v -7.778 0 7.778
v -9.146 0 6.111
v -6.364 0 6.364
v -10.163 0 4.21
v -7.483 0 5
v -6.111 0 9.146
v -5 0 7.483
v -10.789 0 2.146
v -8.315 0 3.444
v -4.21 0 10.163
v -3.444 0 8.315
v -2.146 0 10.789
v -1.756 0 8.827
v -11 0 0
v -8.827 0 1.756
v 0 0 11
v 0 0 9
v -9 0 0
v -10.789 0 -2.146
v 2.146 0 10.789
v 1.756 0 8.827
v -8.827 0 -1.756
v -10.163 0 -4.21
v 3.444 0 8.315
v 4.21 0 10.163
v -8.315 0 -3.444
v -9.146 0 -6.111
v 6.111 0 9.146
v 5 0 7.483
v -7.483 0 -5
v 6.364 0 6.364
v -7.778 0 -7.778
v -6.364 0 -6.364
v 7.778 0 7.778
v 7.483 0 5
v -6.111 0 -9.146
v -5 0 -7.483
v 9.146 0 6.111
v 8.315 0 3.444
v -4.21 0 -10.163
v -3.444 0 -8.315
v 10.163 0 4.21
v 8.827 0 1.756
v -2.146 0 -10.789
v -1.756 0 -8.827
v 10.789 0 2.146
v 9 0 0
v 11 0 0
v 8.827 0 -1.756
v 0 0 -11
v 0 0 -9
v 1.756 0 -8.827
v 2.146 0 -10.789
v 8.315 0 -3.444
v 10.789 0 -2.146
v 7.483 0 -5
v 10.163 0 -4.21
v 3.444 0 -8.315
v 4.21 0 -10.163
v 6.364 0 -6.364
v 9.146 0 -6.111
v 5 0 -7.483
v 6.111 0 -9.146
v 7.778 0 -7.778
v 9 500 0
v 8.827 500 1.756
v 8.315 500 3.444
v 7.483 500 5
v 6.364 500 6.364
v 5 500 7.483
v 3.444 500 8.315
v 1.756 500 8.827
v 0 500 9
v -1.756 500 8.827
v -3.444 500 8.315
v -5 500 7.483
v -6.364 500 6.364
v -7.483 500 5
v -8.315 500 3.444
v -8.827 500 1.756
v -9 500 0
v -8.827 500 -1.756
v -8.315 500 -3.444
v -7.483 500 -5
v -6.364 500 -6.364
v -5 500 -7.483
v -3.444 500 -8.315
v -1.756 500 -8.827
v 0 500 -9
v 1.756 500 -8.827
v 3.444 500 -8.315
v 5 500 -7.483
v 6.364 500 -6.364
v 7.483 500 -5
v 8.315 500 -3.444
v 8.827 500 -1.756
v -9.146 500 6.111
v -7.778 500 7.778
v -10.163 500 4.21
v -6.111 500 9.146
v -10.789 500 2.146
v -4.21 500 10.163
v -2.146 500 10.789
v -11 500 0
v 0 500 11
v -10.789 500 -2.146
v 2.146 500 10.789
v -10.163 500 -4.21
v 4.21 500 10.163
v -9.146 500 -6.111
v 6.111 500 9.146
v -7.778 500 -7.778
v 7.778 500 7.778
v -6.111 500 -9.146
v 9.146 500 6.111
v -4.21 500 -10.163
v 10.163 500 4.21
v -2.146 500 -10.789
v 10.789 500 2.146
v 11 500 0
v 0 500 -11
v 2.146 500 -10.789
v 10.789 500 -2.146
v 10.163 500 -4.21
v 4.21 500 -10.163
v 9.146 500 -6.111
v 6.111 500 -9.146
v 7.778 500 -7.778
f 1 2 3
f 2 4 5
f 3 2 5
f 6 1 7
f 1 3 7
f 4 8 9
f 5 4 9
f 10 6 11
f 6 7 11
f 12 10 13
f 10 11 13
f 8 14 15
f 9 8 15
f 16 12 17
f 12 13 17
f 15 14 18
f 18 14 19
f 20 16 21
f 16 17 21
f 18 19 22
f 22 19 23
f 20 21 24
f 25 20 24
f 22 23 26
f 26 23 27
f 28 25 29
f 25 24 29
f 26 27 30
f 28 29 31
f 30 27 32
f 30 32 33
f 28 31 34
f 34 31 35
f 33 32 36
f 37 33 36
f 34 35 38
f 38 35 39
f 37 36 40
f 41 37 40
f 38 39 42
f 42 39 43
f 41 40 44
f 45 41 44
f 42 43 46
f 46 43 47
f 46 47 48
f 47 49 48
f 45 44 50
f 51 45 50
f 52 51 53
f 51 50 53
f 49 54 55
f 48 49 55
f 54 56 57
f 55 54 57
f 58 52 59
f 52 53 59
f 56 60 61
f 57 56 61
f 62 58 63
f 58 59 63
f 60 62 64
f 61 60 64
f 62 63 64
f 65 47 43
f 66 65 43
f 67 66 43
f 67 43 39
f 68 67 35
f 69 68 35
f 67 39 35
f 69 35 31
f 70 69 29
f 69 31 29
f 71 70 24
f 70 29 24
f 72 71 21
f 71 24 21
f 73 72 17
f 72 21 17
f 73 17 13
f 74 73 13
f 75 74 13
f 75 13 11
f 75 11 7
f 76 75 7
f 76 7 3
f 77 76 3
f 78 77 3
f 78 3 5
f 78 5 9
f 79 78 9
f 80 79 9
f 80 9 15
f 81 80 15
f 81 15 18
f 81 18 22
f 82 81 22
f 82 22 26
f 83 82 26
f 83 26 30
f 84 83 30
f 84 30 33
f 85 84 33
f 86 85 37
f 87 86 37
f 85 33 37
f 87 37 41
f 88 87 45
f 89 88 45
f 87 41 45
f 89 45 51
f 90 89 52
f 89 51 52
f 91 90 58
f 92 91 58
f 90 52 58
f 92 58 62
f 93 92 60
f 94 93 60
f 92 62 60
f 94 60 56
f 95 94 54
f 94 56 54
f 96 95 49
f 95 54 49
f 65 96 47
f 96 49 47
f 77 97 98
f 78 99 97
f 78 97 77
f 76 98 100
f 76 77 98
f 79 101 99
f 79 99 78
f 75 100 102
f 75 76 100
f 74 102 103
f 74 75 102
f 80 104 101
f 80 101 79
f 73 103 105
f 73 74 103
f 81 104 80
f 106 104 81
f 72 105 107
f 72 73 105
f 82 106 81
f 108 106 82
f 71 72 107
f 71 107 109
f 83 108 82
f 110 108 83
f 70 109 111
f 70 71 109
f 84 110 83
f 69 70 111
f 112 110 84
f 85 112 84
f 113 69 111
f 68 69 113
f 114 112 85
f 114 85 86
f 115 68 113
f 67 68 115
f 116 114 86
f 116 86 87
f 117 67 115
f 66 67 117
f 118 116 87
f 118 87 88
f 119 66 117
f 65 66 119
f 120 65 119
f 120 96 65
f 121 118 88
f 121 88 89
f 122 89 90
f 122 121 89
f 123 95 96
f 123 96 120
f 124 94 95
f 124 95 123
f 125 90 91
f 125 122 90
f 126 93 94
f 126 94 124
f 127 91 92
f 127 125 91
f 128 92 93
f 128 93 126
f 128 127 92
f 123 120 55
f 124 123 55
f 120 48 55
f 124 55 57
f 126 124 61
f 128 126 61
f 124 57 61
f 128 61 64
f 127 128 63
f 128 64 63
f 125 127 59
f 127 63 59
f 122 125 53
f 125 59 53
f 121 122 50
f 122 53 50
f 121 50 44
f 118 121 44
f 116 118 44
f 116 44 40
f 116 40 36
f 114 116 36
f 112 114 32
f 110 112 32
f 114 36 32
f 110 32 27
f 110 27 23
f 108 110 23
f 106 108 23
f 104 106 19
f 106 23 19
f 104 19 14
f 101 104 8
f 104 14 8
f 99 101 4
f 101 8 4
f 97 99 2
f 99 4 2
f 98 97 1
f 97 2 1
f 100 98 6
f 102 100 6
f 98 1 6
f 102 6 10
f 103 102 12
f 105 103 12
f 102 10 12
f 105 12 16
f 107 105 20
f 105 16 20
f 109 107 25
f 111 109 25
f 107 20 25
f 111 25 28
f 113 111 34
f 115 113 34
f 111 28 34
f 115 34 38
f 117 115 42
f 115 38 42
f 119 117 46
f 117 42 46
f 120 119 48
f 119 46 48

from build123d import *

# Parameters (mm, degrees)
SKETCH_1_R          = 11
EXTRUDE_1_DEPTH     = 20
SKETCH_2_R          = 11
EXTRUDE_2_DEPTH     = 480
SKETCH_4_R          = 9
CUT_EXTRUDE_1_DEPTH = 501


with BuildPart() as part:
    # 草图1 → 凸台-拉伸1 (new body)
    with BuildSketch(Plane(origin=(0, 0, 0), x_dir=(1, 0, 0), z_dir=(0, 1, 0))):
        Circle(SKETCH_1_R)
    extrude(amount=EXTRUDE_1_DEPTH)

    # 草图2 → 凸台-拉伸2 (add)
    with BuildSketch(Plane(origin=(0, 20, 0), x_dir=(1, 0, 0), z_dir=(0, 1, 0))):
        Circle(SKETCH_2_R)
    extrude(amount=EXTRUDE_2_DEPTH)

    # 草图4 → 切除-拉伸1 (cut, through all)
    with BuildSketch(Plane.XZ):
        Circle(SKETCH_4_R)
    extrude(amount=-CUT_EXTRUDE_1_DEPTH, mode=Mode.SUBTRACT)


solid = part.part
